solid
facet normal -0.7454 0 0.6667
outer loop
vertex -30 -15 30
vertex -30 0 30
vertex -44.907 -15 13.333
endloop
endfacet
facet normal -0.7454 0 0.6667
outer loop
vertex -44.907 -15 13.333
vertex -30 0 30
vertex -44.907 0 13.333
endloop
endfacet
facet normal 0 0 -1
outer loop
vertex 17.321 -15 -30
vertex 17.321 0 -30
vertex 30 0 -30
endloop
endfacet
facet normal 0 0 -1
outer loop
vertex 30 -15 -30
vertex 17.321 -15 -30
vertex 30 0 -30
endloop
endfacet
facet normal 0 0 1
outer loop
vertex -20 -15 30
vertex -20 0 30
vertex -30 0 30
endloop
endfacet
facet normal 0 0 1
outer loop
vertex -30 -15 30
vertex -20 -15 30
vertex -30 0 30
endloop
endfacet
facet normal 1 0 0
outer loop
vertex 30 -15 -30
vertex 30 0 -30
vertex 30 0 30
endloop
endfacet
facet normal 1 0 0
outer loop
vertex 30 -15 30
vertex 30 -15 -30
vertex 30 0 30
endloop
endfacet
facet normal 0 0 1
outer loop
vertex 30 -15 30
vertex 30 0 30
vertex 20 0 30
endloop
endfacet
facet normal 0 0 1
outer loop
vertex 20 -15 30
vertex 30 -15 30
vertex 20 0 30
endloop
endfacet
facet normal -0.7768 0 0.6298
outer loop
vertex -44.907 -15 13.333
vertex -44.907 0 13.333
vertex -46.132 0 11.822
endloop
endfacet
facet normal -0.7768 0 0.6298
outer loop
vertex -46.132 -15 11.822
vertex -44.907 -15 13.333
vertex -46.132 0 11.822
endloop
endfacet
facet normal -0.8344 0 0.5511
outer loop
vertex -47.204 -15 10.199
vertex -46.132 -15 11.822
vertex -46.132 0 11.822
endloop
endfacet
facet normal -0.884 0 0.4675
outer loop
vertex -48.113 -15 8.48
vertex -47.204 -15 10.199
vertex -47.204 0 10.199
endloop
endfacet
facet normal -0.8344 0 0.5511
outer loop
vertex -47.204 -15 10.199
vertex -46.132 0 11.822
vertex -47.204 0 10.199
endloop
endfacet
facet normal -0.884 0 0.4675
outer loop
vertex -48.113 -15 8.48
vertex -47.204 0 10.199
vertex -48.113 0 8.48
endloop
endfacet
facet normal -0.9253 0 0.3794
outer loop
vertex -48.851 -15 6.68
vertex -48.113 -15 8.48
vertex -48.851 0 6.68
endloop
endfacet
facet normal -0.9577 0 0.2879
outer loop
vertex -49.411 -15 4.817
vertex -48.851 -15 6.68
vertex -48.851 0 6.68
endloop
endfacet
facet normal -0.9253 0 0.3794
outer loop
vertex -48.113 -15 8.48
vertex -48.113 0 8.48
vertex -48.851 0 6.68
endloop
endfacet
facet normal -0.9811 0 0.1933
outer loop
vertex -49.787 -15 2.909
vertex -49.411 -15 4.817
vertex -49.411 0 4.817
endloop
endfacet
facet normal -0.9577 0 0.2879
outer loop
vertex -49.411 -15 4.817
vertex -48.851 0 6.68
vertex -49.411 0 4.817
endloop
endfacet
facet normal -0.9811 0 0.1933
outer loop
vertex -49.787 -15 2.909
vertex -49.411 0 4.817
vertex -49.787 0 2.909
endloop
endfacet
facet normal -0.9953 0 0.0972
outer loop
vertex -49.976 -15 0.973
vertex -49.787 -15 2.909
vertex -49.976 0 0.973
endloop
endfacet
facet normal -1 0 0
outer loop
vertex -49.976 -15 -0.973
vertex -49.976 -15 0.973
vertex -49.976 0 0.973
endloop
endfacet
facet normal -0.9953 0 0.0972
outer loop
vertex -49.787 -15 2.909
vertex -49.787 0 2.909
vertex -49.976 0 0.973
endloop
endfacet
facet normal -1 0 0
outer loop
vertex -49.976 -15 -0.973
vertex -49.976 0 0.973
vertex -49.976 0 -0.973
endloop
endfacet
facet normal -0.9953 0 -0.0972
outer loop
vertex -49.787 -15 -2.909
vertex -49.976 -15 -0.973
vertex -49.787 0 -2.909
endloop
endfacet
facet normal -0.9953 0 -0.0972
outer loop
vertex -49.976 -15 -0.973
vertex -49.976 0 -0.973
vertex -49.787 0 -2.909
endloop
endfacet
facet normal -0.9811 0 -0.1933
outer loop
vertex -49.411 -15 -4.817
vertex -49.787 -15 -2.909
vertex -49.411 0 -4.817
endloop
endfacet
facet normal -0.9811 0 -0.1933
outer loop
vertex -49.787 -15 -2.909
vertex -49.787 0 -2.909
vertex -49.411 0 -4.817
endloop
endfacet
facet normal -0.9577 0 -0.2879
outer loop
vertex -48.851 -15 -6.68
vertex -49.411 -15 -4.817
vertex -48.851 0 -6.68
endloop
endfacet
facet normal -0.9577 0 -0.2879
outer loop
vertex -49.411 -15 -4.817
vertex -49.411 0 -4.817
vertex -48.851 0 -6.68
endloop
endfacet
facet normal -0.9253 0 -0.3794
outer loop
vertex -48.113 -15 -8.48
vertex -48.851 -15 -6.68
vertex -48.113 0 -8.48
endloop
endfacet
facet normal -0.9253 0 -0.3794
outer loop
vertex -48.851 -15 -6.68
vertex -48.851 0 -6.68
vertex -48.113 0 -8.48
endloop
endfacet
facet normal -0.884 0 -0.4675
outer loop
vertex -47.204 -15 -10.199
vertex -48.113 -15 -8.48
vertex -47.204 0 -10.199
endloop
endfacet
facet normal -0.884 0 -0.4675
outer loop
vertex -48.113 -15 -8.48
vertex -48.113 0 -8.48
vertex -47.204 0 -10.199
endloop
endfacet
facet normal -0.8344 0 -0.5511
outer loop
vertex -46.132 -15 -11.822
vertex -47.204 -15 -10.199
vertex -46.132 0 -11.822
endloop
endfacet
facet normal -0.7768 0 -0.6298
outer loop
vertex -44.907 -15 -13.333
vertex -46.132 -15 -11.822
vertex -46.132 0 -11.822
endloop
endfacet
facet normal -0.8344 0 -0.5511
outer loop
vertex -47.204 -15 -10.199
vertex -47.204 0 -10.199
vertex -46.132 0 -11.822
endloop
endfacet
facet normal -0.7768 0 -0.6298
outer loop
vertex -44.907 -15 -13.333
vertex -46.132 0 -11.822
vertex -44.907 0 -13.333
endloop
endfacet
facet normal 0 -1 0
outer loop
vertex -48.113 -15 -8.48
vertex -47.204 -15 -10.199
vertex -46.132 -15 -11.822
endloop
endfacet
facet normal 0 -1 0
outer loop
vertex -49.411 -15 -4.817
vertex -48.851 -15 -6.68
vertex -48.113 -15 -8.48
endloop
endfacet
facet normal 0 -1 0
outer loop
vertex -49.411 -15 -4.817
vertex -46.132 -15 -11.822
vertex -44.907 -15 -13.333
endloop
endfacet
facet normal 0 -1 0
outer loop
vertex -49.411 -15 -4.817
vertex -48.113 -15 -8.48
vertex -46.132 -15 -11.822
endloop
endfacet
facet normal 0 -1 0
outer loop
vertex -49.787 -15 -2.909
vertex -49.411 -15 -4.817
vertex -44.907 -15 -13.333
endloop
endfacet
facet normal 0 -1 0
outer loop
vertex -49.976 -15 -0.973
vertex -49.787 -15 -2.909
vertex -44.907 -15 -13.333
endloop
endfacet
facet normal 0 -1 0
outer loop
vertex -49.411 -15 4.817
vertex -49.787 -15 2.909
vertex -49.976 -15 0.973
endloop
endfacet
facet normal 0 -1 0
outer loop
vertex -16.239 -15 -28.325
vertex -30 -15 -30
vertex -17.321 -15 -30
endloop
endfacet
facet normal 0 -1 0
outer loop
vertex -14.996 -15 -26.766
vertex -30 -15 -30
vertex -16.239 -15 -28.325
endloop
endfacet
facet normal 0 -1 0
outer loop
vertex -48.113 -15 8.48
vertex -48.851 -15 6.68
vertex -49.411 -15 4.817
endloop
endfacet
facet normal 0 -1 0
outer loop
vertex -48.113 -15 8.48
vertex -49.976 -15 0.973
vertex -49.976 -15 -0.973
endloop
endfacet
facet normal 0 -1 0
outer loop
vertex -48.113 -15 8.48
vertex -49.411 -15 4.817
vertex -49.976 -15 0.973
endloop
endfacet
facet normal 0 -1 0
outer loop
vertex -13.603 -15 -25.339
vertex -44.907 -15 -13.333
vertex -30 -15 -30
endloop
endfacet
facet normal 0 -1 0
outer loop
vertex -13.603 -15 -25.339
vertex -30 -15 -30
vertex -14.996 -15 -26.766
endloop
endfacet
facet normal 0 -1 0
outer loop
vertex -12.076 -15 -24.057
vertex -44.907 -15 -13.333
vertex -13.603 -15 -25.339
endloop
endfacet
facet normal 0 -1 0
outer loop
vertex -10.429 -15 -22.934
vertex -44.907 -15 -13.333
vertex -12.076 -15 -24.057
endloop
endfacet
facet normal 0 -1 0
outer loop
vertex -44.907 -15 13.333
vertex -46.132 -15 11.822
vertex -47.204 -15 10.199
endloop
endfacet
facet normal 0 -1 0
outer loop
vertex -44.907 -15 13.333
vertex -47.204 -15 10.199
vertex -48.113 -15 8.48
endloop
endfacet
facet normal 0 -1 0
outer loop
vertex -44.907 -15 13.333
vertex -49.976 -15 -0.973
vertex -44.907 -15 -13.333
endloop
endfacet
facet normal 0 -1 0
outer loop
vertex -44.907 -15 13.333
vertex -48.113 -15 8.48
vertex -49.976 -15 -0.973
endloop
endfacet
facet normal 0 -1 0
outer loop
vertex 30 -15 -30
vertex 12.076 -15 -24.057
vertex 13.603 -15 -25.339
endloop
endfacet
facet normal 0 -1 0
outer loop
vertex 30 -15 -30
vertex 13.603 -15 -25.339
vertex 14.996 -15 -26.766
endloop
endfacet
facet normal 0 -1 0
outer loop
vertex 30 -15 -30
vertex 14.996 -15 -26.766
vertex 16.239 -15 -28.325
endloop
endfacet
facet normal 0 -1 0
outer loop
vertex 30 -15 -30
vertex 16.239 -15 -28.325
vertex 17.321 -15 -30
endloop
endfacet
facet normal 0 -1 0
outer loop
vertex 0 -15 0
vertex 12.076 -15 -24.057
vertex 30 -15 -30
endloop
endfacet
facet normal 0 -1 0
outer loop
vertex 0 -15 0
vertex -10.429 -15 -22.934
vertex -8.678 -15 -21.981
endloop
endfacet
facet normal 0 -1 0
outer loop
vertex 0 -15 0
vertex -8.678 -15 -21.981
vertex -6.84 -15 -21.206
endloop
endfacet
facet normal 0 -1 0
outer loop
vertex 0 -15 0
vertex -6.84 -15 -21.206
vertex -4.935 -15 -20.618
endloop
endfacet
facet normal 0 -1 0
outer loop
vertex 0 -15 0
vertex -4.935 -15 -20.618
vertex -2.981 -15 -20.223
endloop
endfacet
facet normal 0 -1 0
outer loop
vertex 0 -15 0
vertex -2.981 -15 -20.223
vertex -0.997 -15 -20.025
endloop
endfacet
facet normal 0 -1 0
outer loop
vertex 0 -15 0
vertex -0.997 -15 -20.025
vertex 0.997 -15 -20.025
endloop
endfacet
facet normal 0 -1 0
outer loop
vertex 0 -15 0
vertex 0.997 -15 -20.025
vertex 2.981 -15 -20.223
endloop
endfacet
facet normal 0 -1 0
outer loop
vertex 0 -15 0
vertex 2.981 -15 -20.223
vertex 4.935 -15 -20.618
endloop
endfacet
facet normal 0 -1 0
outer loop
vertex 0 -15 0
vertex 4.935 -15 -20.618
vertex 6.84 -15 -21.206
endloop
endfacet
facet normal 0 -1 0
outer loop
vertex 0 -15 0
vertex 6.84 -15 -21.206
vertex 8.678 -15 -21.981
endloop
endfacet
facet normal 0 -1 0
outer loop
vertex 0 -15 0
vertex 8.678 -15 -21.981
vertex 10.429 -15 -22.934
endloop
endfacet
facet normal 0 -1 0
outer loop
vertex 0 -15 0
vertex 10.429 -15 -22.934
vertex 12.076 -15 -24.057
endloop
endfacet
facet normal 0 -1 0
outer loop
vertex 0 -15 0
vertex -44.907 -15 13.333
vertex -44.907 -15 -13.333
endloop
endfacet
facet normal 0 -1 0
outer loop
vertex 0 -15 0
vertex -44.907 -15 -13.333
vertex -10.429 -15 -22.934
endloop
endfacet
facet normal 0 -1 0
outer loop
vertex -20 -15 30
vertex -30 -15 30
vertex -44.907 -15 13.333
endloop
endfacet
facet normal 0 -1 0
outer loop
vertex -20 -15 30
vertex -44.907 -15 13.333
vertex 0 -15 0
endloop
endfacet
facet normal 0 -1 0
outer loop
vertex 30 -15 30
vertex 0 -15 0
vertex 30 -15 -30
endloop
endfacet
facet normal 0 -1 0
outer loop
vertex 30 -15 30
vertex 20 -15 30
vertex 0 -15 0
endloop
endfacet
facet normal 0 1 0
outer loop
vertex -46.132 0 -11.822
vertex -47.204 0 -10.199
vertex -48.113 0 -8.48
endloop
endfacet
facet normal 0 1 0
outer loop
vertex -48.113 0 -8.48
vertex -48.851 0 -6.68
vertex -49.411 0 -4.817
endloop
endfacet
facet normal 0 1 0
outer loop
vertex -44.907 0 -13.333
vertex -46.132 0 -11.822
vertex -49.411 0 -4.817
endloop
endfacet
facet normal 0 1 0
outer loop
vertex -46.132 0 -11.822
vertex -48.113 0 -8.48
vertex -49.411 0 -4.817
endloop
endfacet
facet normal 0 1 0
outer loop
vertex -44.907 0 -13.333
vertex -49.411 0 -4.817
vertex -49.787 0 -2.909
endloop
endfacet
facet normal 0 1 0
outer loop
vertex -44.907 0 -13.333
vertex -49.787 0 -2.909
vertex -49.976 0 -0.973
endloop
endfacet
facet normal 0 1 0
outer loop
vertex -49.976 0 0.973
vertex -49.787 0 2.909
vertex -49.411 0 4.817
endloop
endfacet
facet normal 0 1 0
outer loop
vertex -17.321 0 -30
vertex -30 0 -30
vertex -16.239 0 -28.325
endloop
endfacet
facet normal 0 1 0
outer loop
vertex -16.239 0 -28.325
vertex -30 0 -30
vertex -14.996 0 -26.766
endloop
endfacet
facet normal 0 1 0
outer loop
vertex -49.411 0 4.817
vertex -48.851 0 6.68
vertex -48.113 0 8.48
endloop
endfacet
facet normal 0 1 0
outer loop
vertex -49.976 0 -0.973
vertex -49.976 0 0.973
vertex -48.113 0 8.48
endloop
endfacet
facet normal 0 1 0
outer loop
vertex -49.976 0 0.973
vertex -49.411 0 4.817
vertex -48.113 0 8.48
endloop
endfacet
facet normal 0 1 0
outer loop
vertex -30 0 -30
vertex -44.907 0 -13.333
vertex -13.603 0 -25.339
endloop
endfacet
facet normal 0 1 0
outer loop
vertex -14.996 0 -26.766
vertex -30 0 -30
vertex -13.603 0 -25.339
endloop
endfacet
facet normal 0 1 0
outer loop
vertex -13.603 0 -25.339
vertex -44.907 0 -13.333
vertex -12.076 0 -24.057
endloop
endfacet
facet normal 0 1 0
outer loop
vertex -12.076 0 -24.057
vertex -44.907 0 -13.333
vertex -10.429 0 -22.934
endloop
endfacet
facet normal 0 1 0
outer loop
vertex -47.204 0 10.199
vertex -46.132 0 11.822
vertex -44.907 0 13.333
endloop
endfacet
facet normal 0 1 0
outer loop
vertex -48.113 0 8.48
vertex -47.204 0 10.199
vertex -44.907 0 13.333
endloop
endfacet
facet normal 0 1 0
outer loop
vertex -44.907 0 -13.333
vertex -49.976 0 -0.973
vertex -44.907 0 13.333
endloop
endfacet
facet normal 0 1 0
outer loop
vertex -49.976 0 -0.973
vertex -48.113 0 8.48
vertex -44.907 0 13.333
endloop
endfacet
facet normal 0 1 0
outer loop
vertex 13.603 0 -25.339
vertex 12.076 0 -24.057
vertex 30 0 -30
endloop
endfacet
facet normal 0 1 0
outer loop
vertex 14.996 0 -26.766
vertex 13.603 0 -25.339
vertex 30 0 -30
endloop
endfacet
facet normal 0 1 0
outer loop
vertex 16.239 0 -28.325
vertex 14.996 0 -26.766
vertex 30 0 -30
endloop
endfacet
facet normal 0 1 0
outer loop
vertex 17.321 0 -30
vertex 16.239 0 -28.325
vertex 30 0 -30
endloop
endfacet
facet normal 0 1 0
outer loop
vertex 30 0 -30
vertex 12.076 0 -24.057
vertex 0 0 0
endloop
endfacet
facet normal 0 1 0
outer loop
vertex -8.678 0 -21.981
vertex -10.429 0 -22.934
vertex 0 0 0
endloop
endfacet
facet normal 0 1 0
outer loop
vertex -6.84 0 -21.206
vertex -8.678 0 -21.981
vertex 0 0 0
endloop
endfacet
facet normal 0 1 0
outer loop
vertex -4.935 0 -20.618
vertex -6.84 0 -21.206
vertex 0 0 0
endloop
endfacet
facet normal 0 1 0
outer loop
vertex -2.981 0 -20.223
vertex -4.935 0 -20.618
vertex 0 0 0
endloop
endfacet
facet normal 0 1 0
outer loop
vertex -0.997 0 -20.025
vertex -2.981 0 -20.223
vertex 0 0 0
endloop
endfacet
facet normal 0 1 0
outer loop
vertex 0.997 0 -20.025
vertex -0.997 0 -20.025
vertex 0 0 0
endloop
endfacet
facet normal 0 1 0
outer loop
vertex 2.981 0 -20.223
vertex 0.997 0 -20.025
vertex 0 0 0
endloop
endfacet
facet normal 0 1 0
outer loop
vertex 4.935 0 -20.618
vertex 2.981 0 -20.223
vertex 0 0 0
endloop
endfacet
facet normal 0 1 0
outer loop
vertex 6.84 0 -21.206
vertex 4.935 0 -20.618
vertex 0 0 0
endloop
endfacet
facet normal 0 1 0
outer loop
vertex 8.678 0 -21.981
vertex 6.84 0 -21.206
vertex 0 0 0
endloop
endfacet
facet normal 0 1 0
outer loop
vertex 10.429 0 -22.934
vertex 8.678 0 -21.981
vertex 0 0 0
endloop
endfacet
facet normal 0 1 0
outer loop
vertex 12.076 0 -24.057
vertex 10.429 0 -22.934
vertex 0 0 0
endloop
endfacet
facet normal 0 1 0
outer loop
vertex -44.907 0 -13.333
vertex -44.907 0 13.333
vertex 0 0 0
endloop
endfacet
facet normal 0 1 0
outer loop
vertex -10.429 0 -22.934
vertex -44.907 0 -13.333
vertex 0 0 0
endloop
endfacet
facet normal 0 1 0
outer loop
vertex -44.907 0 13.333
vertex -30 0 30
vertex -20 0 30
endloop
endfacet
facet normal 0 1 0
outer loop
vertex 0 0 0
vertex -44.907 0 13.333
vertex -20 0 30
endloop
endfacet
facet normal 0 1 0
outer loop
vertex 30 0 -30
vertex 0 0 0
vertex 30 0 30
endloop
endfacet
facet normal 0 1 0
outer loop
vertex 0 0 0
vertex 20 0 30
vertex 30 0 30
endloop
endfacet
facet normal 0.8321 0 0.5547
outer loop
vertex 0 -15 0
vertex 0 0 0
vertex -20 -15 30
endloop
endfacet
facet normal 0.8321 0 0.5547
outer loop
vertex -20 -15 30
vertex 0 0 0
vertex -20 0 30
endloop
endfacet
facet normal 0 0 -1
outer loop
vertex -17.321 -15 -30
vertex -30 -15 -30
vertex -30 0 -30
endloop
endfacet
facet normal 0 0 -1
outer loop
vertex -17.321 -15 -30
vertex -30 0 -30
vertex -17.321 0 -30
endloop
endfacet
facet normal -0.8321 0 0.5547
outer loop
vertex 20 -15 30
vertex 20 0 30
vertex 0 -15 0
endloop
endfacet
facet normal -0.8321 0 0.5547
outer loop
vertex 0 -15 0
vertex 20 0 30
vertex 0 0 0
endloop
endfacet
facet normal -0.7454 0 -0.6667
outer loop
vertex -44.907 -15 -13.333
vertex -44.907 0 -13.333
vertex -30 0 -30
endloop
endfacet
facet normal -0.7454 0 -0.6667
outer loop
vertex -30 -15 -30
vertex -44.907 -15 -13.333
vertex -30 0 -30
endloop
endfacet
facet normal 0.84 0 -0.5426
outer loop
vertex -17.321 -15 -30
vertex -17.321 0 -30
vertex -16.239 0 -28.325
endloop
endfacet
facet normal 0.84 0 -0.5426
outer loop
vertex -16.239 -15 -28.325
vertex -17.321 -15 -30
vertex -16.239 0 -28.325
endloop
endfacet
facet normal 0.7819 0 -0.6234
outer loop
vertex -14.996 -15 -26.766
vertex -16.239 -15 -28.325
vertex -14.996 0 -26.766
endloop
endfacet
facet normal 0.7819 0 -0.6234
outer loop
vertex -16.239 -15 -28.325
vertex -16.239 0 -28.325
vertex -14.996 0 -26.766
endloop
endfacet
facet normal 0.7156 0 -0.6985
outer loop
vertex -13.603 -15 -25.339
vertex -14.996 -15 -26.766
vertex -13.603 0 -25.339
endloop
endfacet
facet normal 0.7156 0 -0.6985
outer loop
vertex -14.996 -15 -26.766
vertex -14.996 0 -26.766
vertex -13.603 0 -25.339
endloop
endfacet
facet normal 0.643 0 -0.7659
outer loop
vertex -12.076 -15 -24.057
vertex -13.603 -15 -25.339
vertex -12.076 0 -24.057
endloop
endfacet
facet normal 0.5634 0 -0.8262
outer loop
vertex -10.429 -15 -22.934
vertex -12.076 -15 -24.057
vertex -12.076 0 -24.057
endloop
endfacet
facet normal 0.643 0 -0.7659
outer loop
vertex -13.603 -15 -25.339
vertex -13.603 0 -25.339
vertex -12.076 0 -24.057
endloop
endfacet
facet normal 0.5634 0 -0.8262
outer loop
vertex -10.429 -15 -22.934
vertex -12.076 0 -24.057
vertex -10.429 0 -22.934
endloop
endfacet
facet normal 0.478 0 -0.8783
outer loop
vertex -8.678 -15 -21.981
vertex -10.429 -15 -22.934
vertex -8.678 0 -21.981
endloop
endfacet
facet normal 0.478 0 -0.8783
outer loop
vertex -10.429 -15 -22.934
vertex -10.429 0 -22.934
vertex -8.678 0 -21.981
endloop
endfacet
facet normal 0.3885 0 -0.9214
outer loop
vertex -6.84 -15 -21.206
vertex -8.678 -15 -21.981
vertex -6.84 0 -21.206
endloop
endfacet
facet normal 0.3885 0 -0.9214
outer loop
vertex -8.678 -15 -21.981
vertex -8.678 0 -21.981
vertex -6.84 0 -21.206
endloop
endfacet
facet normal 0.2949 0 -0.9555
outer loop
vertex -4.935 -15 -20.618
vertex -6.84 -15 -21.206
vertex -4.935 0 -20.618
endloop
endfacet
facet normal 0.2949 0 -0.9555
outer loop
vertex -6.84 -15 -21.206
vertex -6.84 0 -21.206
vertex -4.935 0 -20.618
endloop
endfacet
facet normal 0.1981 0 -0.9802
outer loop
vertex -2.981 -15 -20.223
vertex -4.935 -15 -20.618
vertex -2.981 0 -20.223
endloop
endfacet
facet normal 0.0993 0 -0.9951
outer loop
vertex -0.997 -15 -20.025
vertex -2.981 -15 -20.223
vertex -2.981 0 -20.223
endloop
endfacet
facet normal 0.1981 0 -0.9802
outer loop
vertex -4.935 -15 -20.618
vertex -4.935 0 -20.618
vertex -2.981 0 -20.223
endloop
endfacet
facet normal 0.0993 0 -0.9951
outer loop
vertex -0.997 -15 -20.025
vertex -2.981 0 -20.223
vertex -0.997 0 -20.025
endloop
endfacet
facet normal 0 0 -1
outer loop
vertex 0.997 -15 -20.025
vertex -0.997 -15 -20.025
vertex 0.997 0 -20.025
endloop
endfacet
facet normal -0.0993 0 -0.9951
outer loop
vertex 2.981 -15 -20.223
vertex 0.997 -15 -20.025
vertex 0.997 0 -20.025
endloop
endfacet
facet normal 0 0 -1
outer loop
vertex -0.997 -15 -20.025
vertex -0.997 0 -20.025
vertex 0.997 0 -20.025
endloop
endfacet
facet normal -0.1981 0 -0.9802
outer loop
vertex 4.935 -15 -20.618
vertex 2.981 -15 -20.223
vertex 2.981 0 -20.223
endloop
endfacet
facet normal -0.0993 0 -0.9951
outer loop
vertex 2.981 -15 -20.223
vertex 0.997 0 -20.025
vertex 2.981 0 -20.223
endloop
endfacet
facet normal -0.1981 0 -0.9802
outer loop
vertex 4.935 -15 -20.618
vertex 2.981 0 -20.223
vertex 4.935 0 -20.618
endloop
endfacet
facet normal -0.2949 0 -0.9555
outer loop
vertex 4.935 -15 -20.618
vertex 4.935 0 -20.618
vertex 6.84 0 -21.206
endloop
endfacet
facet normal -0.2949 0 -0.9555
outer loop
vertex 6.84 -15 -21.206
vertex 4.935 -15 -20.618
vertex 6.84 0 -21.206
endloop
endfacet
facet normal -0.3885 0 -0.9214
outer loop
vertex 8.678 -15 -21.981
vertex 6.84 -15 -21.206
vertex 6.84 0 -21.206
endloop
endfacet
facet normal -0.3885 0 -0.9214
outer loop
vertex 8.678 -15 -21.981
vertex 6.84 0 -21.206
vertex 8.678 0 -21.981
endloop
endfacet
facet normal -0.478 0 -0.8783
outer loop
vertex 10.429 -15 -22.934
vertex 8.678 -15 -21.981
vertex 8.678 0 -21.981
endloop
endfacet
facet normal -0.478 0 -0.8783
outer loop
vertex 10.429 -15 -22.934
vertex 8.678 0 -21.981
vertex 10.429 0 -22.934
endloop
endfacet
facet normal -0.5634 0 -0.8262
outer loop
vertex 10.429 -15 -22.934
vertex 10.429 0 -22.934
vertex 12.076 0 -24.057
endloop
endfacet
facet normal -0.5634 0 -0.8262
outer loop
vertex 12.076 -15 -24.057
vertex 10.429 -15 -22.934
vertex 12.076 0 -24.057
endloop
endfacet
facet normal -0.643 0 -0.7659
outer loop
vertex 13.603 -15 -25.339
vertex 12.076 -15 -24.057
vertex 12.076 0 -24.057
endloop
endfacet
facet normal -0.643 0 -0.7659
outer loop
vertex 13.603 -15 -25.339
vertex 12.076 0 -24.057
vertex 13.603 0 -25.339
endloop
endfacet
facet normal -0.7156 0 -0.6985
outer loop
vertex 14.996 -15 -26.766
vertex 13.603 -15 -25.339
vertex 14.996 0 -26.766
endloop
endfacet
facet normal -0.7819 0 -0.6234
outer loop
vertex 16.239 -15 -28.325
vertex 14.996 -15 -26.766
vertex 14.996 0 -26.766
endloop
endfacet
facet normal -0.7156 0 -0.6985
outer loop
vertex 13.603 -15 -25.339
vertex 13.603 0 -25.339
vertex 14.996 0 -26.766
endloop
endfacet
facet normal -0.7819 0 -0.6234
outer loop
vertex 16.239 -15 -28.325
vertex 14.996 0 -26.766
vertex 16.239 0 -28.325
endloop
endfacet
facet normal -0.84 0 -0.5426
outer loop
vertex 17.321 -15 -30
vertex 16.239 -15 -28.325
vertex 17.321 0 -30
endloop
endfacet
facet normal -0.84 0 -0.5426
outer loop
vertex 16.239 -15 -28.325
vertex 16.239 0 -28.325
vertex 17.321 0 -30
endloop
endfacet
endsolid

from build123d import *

# Parameters (mm, degrees)
F1_DEPTH = 15


with BuildPart() as f1:
    # F0 (on Front) → F1 (new body)
    with BuildSketch(Plane.XZ):
        with BuildLine():
            Line((-20, 30), (-30, 30))
            Line((-30, 30), (-44.90712, 13.333333))
            ThreePointArc((-44.90712, 13.333333), (-50, 0), (-44.90712, -13.333333))
            Line((-44.90712, -13.333333), (-30, -30))
            Line((-30, -30), (-17.320508, -30))
            ThreePointArc((-17.320508, -30), (0, -20), (17.320508, -30))
            Line((17.320508, -30), (30, -30))
            Line((30, -30), (30, 30))
            Line((30, 30), (20, 30))
            Line((20, 30), (0, 0))
            Line((0, 0), (-20, 30))
        make_face()
    extrude(amount=F1_DEPTH)


solid = f1.part
